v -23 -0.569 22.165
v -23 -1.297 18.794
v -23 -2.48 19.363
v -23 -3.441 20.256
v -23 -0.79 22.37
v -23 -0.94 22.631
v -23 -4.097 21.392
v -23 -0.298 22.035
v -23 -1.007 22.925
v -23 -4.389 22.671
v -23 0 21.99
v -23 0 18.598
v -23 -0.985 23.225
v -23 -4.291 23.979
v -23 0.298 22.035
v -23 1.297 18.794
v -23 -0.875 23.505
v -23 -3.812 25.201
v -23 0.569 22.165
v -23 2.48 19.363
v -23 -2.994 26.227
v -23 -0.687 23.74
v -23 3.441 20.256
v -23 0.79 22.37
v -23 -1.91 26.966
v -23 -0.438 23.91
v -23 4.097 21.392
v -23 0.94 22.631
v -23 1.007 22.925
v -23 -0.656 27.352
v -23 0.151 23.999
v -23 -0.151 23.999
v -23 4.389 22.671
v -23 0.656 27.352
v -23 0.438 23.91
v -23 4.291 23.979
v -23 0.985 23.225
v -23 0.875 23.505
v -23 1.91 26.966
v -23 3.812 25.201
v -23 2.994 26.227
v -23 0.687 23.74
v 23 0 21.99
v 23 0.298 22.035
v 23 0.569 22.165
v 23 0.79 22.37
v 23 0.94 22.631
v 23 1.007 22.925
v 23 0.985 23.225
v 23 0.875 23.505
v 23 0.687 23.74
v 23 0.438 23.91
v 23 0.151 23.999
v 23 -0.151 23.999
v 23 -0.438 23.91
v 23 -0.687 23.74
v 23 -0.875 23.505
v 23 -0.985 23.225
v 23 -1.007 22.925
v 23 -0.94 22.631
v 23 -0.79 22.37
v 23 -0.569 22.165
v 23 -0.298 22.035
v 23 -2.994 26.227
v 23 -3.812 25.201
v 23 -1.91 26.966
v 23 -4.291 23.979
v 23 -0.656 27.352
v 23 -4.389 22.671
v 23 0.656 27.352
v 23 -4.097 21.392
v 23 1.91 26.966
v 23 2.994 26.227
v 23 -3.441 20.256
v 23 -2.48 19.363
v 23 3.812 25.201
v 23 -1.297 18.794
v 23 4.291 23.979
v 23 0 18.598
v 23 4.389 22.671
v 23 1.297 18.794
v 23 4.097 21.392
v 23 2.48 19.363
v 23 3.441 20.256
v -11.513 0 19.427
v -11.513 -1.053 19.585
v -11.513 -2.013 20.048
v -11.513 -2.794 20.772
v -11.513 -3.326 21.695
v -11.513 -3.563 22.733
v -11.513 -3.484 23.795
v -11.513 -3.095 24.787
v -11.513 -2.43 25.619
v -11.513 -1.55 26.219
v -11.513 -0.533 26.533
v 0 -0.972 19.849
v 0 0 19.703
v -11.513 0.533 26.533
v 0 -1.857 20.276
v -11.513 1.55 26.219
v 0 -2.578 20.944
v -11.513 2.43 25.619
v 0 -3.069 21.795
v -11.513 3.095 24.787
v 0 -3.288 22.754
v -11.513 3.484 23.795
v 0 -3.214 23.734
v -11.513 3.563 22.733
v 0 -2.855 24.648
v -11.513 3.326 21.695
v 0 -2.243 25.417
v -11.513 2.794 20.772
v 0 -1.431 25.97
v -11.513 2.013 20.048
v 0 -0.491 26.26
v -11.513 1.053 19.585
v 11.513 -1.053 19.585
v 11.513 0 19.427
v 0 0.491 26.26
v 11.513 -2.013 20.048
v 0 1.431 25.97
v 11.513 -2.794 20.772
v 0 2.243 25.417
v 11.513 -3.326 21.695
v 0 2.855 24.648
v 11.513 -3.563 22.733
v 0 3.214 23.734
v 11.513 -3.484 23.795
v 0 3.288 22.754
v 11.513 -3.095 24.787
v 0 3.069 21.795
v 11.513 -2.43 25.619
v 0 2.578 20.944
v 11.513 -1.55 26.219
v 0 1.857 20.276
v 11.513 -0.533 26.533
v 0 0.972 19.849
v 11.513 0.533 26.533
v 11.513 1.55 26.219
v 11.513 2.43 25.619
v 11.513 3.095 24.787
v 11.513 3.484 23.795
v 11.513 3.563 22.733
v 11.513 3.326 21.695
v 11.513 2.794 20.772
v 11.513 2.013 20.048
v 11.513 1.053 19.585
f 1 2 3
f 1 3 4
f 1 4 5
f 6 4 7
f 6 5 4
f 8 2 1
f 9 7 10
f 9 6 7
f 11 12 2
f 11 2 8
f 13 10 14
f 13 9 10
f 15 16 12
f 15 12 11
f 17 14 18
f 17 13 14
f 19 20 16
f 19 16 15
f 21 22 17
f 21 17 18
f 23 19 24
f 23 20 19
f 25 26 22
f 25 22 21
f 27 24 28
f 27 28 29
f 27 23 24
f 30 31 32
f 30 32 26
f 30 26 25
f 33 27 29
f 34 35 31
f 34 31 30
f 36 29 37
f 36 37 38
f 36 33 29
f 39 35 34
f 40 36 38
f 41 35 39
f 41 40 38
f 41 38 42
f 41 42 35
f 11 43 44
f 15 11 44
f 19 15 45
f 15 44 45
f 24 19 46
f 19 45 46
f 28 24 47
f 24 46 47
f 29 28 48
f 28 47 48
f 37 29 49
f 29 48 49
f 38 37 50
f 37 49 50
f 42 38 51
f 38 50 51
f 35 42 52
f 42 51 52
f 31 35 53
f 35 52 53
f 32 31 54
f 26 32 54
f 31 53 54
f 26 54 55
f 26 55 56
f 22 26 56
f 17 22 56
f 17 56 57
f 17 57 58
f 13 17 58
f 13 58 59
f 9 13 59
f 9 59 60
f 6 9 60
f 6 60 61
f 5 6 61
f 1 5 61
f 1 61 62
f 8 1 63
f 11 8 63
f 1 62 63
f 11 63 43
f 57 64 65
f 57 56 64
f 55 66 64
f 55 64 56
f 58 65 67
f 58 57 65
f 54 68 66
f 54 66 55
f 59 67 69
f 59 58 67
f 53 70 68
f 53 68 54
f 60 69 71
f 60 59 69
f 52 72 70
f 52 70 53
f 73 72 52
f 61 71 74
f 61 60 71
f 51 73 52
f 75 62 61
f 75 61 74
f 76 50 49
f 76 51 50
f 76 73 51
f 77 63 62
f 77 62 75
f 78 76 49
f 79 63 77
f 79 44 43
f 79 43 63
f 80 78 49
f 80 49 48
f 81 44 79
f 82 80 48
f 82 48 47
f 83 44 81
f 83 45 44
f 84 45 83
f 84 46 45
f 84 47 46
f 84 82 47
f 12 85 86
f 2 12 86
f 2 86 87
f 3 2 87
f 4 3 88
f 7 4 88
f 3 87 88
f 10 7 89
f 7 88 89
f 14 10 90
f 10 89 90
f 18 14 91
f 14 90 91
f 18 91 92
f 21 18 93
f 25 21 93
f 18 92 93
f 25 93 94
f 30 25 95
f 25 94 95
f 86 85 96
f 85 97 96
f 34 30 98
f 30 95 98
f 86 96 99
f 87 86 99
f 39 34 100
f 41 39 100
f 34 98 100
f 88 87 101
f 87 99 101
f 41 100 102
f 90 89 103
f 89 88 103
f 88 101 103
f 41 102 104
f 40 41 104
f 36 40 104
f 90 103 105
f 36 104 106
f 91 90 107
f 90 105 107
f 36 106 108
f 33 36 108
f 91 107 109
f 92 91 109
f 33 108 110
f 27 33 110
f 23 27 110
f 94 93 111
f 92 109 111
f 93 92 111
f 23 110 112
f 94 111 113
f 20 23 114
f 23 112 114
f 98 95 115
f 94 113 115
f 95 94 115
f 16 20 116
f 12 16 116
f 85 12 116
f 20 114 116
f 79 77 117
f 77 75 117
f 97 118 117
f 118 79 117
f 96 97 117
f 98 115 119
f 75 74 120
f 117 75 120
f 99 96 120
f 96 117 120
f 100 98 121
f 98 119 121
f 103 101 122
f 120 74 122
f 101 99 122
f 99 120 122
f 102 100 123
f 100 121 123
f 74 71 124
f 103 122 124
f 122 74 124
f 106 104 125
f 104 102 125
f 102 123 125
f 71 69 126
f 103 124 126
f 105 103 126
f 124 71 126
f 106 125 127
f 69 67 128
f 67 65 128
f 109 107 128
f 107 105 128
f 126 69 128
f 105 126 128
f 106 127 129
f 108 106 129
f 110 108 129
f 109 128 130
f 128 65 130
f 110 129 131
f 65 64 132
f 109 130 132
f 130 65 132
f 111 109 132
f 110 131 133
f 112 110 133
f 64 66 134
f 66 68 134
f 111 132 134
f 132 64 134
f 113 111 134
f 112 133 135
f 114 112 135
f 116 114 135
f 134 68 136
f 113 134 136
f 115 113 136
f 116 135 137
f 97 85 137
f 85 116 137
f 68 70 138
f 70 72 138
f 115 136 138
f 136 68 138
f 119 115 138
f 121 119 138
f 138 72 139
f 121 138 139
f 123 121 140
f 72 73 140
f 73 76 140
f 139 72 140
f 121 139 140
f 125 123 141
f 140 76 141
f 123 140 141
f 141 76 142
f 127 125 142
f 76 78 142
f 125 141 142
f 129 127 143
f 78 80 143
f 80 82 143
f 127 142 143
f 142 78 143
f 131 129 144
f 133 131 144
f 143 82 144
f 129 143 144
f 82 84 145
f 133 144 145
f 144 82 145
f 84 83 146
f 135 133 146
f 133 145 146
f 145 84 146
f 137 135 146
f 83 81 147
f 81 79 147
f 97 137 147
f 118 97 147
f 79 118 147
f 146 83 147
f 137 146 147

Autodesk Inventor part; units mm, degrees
ref_plane "YZ Plane" through (0, 0, 0) normal (1, 0, 0) x (0, 1, 0)
ref_plane "XZ Plane" through (0, 0, 0) normal (0, 1, 0) x (-1, 0, 0)
ref_plane "XY Plane" through (0, 0, 0) normal (0, 0, 1) x (1, 0, 0)
sketch "Sketch1" plane through (0, 0, 0) normal (0, 1, 0) x (-1, 0, 0)
  line L0 (24, 18.5) -> (24, 23)
  line L1 (24, 23) -> (-24, 23)
  line L2 (-24, 23) -> (-24, 18.5)
  arc A0 (24, 18.5) -> (-24, 18.5) centre (0, -220.297) ccw
  point P0 (0, 0)
  dimension "d9" = 4.5
  dimension "d10" = 240
revolve "Revolution1" add sketch "Sketch1" angle 360 about axis through (-24, 0, 23) along (1, 0, 0)
sketch "Sketch2" plane through (24, 0, 23) normal (1, 0, 0) x (0, 0, -1)
  circle A0 centre (0, 0) radius 4.5 projected
  circle A1 centre (0, 0) radius 1.01
  point P0 (23, 0)
  dimension "d12" = 2.02
extrude "Extrusion1" cut sketch "Sketch2" against normal blind 48 contours A1
sketch "Sketch4" plane through (-24, 0, 23) normal (-1, 0, 0) x (0, 0, 1)
  circle A0 centre (0, 0) radius 1.01 projected
  circle A1 centre (0, 0) radius 4.5
  point P0 (-23, 0)
extrude "Extrusion2" cut sketch "Sketch4" against normal blind 1
sketch "Sketch5" plane through (24, 0, 23) normal (1, 0, 0) x (0, 0, -1)
  circle A0 centre (0, 0) radius 1.01 projected
  circle A1 centre (0, 0) radius 4.5
  point P0 (23, 0)
extrude "Extrusion3" cut sketch "Sketch5" against normal blind 1 contours A0 | A1
properties part number "Roller"
